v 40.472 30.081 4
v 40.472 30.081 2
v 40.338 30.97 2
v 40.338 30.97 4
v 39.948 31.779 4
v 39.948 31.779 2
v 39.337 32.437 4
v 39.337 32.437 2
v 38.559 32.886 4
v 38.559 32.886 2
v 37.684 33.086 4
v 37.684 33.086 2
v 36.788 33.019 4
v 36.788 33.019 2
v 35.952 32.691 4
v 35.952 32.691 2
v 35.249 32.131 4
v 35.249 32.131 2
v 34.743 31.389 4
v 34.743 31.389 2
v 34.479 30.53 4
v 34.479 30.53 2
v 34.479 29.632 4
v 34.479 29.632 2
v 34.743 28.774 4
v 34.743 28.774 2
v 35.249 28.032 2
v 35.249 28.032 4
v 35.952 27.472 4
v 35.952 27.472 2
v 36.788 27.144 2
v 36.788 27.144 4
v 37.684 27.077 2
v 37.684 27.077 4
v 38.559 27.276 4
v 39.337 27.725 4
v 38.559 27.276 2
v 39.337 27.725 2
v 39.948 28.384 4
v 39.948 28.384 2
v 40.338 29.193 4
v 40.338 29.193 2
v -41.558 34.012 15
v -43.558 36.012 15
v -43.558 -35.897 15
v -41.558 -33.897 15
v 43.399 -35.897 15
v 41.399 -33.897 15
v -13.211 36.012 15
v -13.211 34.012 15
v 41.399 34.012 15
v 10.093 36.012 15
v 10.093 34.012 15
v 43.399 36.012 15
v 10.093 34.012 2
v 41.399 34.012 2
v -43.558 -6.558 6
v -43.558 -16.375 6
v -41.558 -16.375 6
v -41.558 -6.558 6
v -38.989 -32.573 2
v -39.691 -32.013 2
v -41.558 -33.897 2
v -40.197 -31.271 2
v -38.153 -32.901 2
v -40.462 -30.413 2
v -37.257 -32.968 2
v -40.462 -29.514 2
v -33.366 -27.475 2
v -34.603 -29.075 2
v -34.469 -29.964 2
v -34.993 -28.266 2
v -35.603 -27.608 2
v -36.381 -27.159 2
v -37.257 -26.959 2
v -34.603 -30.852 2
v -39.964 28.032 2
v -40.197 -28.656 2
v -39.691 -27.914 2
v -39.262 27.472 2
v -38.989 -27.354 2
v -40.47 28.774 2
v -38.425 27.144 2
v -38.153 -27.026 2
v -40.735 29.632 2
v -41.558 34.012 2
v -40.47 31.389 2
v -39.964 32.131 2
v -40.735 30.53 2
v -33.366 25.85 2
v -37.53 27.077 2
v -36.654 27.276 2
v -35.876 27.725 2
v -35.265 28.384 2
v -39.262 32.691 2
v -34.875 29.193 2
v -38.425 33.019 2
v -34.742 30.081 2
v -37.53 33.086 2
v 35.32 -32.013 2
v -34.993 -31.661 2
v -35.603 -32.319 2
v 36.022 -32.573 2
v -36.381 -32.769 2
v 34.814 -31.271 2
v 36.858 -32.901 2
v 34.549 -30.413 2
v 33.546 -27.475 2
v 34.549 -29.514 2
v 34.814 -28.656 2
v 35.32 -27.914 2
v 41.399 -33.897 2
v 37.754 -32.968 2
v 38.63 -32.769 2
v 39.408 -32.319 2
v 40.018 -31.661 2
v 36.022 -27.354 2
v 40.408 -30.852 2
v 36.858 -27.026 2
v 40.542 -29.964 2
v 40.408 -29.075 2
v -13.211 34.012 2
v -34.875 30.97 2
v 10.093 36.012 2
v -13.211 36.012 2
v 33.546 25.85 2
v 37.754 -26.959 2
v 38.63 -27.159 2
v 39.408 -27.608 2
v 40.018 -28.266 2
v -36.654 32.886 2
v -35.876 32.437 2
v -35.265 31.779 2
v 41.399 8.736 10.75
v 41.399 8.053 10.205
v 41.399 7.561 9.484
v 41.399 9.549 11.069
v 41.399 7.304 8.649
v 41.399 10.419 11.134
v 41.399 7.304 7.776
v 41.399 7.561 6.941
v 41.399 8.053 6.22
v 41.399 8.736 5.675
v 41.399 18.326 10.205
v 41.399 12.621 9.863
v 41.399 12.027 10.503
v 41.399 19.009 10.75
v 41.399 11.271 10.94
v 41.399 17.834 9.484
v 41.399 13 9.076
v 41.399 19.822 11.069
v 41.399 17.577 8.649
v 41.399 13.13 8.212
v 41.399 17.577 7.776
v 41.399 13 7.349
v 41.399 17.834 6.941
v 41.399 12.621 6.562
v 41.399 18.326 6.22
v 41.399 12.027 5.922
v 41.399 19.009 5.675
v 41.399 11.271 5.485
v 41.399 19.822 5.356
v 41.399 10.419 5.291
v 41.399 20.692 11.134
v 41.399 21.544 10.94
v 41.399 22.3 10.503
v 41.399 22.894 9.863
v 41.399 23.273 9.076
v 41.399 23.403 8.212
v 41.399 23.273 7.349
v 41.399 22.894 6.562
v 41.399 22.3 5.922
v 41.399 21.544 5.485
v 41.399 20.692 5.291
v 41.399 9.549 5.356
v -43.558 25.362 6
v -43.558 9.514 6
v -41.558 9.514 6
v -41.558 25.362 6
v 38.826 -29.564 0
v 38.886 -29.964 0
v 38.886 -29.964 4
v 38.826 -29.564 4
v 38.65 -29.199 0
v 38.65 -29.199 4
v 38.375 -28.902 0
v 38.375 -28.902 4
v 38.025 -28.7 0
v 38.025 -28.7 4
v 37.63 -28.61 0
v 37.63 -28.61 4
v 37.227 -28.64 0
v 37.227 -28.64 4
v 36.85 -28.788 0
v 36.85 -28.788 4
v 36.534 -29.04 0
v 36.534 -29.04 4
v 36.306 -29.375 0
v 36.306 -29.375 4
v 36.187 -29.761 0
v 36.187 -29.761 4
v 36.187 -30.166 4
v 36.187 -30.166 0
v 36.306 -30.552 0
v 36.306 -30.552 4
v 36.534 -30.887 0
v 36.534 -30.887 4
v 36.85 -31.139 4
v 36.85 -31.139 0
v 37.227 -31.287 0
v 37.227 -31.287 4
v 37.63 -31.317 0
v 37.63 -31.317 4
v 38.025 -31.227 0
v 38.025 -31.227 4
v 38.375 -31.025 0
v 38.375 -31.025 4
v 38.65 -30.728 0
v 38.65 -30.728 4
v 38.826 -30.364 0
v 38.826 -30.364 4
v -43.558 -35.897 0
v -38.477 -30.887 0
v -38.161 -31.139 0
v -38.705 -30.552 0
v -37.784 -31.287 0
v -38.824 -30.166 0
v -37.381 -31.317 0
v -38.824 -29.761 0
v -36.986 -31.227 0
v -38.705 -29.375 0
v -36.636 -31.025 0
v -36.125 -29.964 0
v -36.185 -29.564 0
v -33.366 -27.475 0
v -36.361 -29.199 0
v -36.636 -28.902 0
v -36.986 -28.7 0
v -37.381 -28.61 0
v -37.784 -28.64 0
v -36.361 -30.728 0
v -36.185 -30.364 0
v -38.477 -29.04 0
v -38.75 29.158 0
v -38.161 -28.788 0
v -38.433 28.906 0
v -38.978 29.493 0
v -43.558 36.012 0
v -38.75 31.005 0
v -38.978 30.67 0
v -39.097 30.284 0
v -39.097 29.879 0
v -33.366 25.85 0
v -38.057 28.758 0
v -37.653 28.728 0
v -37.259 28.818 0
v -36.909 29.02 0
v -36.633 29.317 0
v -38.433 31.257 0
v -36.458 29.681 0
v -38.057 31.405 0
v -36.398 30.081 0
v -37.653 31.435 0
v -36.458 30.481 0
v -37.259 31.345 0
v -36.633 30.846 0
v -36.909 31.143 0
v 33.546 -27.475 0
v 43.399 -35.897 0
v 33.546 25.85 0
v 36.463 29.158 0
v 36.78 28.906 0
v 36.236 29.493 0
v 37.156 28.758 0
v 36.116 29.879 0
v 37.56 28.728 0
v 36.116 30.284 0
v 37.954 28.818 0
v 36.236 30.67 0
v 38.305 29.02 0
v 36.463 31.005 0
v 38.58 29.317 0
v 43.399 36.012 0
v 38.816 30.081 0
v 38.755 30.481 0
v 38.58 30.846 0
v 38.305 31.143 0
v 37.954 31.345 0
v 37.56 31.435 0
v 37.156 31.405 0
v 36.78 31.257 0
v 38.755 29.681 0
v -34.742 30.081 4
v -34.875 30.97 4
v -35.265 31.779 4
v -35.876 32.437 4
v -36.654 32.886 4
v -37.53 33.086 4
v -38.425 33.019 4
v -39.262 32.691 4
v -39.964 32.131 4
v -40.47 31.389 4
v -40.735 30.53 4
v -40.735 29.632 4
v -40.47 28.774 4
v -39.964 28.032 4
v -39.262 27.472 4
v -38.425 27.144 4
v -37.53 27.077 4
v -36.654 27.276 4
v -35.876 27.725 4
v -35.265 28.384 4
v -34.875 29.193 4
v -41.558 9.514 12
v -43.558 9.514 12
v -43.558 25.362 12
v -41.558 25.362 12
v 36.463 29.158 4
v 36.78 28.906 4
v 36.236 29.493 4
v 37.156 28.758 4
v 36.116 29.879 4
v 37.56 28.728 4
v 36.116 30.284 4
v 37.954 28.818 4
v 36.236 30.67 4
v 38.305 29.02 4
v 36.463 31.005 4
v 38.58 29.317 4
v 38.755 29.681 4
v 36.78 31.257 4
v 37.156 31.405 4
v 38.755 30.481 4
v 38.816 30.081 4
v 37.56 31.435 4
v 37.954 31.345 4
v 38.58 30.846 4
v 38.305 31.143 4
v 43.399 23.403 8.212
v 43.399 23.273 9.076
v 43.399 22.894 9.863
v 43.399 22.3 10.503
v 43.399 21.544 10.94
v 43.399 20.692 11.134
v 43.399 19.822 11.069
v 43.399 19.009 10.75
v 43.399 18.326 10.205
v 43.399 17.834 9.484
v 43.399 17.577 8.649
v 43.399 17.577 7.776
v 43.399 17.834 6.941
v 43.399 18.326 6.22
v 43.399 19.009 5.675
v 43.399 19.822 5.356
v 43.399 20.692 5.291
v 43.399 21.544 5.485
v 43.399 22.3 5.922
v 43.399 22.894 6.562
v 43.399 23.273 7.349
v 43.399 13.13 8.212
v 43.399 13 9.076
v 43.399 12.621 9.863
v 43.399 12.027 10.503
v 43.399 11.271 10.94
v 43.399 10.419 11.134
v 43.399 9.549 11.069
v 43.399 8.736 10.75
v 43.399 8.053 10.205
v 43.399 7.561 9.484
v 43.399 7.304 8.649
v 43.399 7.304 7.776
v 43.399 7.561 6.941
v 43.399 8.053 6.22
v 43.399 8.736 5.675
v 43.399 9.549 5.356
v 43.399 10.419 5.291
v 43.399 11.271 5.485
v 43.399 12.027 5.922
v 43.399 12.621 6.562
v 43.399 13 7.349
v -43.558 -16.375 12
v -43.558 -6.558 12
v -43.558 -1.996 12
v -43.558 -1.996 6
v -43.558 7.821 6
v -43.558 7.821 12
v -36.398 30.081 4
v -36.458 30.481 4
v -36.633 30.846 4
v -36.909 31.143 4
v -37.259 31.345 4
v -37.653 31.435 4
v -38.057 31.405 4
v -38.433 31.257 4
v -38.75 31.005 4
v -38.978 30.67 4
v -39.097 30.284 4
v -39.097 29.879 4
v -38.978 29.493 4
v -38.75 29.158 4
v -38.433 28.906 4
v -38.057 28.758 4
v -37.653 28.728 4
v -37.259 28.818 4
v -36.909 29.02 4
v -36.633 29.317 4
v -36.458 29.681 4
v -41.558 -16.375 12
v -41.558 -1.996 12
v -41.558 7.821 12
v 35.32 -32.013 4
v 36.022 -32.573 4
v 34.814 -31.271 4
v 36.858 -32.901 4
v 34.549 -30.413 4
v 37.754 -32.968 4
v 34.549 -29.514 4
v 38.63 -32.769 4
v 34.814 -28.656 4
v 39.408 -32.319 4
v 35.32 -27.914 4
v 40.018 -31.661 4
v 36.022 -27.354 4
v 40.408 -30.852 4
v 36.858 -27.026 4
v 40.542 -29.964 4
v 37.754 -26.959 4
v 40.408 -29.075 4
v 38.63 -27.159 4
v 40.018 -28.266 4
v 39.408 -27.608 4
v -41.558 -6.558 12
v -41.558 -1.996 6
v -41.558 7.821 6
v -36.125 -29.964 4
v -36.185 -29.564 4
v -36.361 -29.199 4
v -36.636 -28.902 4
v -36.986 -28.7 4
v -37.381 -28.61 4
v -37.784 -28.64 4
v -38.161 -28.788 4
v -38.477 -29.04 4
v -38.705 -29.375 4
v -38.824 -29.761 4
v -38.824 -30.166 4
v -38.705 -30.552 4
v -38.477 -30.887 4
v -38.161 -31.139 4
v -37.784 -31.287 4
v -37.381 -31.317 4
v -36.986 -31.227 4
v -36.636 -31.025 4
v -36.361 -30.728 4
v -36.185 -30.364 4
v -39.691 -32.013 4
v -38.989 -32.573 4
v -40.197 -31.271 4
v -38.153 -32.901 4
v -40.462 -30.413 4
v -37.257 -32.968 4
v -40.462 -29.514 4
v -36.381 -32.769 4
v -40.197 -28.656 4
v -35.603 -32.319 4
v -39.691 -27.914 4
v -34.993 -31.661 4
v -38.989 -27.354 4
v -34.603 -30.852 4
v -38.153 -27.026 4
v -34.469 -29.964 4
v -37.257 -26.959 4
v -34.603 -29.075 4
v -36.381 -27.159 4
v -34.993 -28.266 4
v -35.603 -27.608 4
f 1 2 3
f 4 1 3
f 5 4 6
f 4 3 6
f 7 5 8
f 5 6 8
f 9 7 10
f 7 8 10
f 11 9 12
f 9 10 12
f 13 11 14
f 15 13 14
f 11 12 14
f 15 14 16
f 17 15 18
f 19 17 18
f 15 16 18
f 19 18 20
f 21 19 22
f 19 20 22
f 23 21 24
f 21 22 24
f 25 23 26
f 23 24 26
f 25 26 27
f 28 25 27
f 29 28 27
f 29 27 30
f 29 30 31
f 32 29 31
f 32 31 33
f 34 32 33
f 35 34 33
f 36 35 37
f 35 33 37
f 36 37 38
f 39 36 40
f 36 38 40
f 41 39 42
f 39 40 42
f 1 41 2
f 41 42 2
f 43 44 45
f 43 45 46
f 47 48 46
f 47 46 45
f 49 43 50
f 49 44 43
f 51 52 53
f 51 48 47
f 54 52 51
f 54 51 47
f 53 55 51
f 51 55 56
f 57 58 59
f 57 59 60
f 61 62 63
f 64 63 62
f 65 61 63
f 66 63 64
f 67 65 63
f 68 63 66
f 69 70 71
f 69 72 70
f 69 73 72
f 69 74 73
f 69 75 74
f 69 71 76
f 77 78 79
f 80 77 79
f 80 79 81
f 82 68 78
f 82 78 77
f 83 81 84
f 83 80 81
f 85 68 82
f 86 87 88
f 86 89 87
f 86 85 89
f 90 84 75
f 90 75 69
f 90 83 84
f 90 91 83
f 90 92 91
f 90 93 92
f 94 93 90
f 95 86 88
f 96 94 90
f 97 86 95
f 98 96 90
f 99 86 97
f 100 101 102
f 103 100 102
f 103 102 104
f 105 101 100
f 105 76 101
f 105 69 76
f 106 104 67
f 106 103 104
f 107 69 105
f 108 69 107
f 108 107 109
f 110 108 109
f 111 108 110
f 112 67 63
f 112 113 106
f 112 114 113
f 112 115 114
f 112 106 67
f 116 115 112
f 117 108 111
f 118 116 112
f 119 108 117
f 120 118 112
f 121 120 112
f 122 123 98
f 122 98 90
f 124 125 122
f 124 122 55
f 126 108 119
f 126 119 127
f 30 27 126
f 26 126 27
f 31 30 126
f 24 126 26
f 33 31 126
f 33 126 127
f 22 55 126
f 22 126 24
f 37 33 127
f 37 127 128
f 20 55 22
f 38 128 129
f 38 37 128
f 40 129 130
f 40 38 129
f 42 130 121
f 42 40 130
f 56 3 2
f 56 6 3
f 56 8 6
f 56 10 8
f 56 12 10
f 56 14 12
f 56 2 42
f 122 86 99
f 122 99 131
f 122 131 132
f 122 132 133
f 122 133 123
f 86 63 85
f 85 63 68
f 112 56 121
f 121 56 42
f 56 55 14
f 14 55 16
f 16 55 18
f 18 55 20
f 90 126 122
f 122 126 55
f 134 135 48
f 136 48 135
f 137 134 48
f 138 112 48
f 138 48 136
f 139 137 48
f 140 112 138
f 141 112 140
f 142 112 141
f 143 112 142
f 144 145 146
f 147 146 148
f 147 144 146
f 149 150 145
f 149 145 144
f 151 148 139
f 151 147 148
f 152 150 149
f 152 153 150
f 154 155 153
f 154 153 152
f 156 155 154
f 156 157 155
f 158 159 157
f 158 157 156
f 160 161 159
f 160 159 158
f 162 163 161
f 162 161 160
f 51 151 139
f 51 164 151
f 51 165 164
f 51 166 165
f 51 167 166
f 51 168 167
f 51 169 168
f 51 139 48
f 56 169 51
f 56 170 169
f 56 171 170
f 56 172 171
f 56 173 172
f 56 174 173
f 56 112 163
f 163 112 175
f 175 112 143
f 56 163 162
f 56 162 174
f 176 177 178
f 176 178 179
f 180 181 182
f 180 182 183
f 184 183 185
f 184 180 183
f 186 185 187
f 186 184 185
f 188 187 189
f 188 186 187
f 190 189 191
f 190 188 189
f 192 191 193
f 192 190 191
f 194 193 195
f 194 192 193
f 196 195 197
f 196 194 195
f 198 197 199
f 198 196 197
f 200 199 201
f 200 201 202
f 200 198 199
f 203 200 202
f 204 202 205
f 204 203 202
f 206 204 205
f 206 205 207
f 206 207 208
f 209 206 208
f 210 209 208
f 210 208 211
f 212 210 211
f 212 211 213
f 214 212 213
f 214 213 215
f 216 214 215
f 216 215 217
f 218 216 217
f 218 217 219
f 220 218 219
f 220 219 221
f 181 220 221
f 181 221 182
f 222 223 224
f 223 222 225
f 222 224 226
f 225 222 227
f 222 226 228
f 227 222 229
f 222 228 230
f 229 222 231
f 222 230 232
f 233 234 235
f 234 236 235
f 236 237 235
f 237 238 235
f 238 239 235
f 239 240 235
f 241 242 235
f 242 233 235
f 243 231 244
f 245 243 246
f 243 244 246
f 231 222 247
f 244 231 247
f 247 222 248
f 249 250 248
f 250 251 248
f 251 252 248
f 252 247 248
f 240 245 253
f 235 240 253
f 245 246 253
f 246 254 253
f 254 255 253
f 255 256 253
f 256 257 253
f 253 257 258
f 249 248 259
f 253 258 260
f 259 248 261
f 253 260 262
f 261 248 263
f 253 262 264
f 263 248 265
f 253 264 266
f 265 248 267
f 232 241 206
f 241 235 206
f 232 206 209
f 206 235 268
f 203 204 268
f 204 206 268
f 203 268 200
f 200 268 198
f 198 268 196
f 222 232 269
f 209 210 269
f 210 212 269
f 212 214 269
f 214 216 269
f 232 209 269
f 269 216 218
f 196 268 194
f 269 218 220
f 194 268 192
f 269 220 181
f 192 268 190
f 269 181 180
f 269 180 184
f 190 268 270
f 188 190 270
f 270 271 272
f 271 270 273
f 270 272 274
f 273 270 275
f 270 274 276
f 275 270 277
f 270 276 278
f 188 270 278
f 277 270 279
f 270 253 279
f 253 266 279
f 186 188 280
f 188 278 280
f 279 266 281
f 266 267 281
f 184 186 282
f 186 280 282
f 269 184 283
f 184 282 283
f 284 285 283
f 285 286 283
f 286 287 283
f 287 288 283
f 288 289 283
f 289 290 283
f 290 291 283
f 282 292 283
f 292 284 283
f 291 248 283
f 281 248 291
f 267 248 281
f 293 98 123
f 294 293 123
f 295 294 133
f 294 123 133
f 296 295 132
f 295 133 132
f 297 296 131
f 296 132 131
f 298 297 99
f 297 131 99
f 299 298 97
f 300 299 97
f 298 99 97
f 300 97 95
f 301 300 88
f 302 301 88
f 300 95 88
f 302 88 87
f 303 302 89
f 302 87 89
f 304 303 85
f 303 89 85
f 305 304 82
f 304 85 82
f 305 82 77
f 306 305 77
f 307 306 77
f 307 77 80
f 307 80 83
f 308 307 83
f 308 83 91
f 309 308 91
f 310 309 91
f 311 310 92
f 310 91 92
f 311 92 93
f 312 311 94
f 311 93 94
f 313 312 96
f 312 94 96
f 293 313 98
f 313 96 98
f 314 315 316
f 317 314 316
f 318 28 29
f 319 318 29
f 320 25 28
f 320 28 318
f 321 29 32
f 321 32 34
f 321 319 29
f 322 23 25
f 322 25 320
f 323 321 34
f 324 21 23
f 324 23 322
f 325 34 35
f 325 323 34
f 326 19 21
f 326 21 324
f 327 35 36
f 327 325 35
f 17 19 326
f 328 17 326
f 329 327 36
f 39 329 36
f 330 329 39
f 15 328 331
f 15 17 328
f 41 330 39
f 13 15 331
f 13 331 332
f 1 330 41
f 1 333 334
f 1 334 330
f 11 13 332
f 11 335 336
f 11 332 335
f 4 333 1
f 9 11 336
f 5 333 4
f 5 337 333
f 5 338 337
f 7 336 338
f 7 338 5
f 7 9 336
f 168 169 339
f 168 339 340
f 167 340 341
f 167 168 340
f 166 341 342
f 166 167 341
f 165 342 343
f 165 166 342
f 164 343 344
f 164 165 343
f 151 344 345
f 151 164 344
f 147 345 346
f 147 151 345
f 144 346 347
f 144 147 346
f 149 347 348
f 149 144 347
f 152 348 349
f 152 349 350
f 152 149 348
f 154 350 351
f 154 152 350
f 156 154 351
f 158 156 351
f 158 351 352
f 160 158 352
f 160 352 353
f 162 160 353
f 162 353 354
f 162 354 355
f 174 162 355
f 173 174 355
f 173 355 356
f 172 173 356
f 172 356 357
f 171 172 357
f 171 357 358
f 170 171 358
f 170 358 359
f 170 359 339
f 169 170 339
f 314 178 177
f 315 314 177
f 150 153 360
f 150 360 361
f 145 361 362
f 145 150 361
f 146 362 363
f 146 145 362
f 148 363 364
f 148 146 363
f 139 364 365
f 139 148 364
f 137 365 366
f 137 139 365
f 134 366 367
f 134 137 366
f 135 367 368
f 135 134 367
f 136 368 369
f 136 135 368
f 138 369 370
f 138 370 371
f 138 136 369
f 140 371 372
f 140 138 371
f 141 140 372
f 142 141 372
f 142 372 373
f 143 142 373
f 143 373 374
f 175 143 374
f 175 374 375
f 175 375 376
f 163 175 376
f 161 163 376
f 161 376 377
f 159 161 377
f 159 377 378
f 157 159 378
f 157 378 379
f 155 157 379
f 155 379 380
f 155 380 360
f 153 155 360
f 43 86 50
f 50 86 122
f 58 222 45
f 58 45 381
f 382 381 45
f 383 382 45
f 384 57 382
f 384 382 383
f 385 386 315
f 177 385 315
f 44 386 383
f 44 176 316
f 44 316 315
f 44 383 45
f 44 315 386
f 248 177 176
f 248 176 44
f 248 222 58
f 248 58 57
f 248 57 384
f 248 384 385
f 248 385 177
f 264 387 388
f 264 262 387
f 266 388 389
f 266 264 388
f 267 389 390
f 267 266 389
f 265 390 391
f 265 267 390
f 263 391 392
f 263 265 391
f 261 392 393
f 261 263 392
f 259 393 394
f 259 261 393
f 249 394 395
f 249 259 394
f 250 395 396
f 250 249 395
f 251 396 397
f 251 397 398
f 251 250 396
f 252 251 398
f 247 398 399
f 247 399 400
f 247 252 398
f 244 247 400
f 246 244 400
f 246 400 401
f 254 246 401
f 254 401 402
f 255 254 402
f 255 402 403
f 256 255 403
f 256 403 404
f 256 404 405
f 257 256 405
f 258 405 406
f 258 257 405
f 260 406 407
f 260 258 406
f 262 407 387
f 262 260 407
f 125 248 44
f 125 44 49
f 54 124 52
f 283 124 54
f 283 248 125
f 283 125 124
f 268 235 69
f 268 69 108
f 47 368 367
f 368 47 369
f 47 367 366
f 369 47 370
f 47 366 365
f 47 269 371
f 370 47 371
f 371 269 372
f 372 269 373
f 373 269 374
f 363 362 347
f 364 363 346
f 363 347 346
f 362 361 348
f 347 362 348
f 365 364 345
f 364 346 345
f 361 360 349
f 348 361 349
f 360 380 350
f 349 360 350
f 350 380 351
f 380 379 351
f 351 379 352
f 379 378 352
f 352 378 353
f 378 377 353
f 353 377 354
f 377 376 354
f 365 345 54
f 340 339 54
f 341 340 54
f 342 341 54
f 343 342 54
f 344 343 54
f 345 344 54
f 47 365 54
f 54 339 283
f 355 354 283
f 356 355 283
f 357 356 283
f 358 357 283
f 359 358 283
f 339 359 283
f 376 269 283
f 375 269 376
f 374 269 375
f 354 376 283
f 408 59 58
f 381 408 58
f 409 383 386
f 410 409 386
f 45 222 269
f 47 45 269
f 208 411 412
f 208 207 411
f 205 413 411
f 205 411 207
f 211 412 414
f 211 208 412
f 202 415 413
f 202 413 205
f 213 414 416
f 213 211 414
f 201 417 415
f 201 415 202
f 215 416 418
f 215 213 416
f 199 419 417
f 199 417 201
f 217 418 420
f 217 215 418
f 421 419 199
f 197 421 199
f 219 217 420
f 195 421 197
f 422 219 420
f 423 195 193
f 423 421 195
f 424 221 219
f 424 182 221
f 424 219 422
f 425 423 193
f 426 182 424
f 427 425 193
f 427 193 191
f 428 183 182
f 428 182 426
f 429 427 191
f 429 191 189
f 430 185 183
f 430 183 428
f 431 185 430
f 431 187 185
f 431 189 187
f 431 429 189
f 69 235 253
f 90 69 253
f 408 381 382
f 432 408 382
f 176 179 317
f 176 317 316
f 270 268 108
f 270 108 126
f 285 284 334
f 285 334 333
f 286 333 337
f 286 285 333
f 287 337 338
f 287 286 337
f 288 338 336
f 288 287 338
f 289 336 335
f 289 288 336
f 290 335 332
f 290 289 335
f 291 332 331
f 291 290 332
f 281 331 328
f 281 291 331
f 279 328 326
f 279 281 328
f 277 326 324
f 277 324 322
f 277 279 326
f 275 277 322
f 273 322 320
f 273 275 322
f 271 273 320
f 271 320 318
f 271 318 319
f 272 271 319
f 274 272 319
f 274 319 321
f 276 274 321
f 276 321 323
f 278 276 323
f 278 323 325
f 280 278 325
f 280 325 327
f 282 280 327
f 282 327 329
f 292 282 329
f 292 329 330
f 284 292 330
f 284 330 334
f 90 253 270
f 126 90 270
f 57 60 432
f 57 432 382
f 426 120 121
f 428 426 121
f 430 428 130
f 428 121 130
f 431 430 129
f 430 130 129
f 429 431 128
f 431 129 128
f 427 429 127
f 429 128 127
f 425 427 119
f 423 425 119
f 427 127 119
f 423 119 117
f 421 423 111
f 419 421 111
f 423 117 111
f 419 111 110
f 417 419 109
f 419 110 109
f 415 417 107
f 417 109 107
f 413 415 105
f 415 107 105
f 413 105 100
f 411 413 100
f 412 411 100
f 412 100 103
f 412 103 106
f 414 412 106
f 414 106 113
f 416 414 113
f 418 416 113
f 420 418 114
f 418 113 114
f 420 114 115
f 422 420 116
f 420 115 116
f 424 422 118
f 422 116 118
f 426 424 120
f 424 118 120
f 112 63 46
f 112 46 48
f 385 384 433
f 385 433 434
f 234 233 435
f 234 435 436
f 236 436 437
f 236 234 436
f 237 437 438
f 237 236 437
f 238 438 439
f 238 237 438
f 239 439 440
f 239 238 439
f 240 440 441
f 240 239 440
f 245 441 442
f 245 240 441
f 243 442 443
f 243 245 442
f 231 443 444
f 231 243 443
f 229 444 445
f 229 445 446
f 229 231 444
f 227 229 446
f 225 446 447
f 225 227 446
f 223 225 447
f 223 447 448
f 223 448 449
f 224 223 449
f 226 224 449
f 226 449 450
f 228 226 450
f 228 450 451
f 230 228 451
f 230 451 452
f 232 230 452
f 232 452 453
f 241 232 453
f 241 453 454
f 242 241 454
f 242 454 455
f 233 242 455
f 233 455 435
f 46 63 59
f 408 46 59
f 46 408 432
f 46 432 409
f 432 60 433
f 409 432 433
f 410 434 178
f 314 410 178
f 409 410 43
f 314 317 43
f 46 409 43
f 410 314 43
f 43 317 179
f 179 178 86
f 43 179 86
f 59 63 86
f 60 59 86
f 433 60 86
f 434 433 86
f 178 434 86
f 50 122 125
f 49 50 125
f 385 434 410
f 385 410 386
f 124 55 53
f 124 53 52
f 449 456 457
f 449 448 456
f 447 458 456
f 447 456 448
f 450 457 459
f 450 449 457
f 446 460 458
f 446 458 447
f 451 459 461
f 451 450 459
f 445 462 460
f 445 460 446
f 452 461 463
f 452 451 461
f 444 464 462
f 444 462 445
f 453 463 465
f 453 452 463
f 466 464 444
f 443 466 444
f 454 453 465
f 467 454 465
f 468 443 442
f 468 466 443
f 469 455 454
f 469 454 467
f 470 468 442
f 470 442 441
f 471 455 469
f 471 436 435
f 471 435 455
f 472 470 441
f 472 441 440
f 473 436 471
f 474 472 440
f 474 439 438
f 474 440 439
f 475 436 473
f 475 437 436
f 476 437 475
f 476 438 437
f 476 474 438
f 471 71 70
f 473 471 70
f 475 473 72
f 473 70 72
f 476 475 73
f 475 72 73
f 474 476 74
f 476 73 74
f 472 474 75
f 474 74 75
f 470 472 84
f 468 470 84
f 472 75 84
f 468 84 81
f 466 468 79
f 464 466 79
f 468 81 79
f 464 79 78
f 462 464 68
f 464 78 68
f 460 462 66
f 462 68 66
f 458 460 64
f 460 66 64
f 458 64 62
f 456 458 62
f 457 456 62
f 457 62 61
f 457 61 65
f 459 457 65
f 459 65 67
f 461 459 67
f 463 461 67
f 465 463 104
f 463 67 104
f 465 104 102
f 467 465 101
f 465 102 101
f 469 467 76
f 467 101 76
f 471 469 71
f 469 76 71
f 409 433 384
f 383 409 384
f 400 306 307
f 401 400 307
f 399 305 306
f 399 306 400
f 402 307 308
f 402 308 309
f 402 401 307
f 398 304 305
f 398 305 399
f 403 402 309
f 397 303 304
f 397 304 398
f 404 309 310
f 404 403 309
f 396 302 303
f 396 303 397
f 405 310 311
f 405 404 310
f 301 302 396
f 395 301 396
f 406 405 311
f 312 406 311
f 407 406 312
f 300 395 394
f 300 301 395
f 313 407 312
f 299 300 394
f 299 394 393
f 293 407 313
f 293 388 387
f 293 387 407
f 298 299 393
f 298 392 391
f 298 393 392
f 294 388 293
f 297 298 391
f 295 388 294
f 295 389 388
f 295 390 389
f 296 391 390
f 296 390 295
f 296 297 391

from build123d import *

# Parameters (mm, degrees)
SKETCH_W        = 82.95665
SKETCH_H        = 67.908462
SKETCH_R        = 1.357232
PAD_DEPTH       = 2
SKETCH001_R     = 3.013294
SKETCH001_R_2   = 1.357232
PAD001_DEPTH    = 2
SKETCH002_W     = 86.95665
SKETCH002_H     = 71.908462
SKETCH002_W_2   = 82.95665
SKETCH002_H_2   = 67.908462
PAD002_DEPTH    = 15
SKETCH003_W     = 23.303855
SKETCH003_H     = 2
POCKET_DEPTH    = 15
SKETCH004_W     = 9.816747
SKETCH004_H     = 53.650996
SKETCH004_W_2   = 9.816748
SKETCH004_W_3   = 15.848155
POCKET001_DEPTH = 6
SKETCH006_R     = 2.929585
POCKET002_DEPTH = 43.398659
SKETCH007_W     = 66.912369
SKETCH007_H     = 53.325719
POCKET003_DEPTH = 5


with BuildPart() as part:
    # Sketch → Pad (new body)
    with BuildSketch(Plane.XY):
        with Locations((-0.079666, 0.057701)):
            Rectangle(SKETCH_W, SKETCH_H)
        with Locations((-37.482224, -29.963587)):
            Circle(SKETCH_R, mode=Mode.SUBTRACT)
        with Locations((37.52877, -29.963587)):
            Circle(SKETCH_R, mode=Mode.SUBTRACT)
        with Locations((-37.754868, 30.081388)):
            Circle(SKETCH_R, mode=Mode.SUBTRACT)
        with Locations((37.458336, 30.081388)):
            Circle(SKETCH_R, mode=Mode.SUBTRACT)
    extrude(amount=PAD_DEPTH)

    # Sketch001 (on DatumPlane) → Pad001 (join)
    with BuildSketch(Plane.XY.offset(2)):
        with Locations((-37.754868, 30.081388)):
            Circle(SKETCH001_R)
        with Locations((-37.754868, 30.081388)):
            Circle(SKETCH001_R_2, mode=Mode.SUBTRACT)
        with Locations((37.458336, 30.081388)):
            Circle(SKETCH001_R)
        with Locations((37.458336, 30.081388)):
            Circle(SKETCH001_R_2, mode=Mode.SUBTRACT)
        with Locations((37.52877, -29.963587)):
            Circle(SKETCH001_R)
        with Locations((37.52877, -29.963587)):
            Circle(SKETCH001_R_2, mode=Mode.SUBTRACT)
        with Locations((-37.482224, -29.963587)):
            Circle(SKETCH001_R)
        with Locations((-37.482224, -29.963587)):
            Circle(SKETCH001_R_2, mode=Mode.SUBTRACT)
    extrude(amount=PAD001_DEPTH)

    # Sketch002 → Pad002 (join)
    with BuildSketch(Plane.XY):
        with Locations((-0.079666, 0.057701)):
            Rectangle(SKETCH002_W, SKETCH002_H)
        with Locations((-0.079666, 0.057701)):
            Rectangle(SKETCH002_W_2, SKETCH002_H_2, mode=Mode.SUBTRACT)
    extrude(amount=PAD002_DEPTH)

    # Sketch003 (on DatumPlane) → Pocket (cut)
    with BuildSketch(Plane.XY.offset(2)):
        with Locations((-1.558922, 35.011932)):
            Rectangle(SKETCH003_W, SKETCH003_H)
    extrude(amount=POCKET_DEPTH, mode=Mode.SUBTRACT)

    # Sketch004 (on DatumPlane) → Pocket001 (cut)
    with BuildSketch(Plane(origin=(37.458336, 30.081388, 6), x_dir=(0, 1, 0), z_dir=(0, 0, 1))):
        with Locations((-41.548102, 54.190829)):
            Rectangle(SKETCH004_W, SKETCH004_H)
        with Locations((-27.168644, 54.190829)):
            Rectangle(SKETCH004_W_2, SKETCH004_H)
        with Locations((-12.643048, 54.190829)):
            Rectangle(SKETCH004_W_3, SKETCH004_H)
    extrude(amount=POCKET001_DEPTH, mode=Mode.SUBTRACT)

    # Sketch006 → Pocket002 (cut)
    with BuildSketch(Plane.YZ):
        with Locations((10.200474, 8.212474)):
            Circle(SKETCH006_R)
        with Locations((20.473468, 8.212474)):
            Circle(SKETCH006_R)
    extrude(amount=POCKET002_DEPTH, mode=Mode.SUBTRACT)

    # Sketch007 → Pocket003 (cut)
    with BuildSketch(Plane.XY):
        with Locations((0.089973, -0.812508)):
            Rectangle(SKETCH007_W, SKETCH007_H)
    extrude(amount=POCKET003_DEPTH, mode=Mode.SUBTRACT)


solid = part.part
